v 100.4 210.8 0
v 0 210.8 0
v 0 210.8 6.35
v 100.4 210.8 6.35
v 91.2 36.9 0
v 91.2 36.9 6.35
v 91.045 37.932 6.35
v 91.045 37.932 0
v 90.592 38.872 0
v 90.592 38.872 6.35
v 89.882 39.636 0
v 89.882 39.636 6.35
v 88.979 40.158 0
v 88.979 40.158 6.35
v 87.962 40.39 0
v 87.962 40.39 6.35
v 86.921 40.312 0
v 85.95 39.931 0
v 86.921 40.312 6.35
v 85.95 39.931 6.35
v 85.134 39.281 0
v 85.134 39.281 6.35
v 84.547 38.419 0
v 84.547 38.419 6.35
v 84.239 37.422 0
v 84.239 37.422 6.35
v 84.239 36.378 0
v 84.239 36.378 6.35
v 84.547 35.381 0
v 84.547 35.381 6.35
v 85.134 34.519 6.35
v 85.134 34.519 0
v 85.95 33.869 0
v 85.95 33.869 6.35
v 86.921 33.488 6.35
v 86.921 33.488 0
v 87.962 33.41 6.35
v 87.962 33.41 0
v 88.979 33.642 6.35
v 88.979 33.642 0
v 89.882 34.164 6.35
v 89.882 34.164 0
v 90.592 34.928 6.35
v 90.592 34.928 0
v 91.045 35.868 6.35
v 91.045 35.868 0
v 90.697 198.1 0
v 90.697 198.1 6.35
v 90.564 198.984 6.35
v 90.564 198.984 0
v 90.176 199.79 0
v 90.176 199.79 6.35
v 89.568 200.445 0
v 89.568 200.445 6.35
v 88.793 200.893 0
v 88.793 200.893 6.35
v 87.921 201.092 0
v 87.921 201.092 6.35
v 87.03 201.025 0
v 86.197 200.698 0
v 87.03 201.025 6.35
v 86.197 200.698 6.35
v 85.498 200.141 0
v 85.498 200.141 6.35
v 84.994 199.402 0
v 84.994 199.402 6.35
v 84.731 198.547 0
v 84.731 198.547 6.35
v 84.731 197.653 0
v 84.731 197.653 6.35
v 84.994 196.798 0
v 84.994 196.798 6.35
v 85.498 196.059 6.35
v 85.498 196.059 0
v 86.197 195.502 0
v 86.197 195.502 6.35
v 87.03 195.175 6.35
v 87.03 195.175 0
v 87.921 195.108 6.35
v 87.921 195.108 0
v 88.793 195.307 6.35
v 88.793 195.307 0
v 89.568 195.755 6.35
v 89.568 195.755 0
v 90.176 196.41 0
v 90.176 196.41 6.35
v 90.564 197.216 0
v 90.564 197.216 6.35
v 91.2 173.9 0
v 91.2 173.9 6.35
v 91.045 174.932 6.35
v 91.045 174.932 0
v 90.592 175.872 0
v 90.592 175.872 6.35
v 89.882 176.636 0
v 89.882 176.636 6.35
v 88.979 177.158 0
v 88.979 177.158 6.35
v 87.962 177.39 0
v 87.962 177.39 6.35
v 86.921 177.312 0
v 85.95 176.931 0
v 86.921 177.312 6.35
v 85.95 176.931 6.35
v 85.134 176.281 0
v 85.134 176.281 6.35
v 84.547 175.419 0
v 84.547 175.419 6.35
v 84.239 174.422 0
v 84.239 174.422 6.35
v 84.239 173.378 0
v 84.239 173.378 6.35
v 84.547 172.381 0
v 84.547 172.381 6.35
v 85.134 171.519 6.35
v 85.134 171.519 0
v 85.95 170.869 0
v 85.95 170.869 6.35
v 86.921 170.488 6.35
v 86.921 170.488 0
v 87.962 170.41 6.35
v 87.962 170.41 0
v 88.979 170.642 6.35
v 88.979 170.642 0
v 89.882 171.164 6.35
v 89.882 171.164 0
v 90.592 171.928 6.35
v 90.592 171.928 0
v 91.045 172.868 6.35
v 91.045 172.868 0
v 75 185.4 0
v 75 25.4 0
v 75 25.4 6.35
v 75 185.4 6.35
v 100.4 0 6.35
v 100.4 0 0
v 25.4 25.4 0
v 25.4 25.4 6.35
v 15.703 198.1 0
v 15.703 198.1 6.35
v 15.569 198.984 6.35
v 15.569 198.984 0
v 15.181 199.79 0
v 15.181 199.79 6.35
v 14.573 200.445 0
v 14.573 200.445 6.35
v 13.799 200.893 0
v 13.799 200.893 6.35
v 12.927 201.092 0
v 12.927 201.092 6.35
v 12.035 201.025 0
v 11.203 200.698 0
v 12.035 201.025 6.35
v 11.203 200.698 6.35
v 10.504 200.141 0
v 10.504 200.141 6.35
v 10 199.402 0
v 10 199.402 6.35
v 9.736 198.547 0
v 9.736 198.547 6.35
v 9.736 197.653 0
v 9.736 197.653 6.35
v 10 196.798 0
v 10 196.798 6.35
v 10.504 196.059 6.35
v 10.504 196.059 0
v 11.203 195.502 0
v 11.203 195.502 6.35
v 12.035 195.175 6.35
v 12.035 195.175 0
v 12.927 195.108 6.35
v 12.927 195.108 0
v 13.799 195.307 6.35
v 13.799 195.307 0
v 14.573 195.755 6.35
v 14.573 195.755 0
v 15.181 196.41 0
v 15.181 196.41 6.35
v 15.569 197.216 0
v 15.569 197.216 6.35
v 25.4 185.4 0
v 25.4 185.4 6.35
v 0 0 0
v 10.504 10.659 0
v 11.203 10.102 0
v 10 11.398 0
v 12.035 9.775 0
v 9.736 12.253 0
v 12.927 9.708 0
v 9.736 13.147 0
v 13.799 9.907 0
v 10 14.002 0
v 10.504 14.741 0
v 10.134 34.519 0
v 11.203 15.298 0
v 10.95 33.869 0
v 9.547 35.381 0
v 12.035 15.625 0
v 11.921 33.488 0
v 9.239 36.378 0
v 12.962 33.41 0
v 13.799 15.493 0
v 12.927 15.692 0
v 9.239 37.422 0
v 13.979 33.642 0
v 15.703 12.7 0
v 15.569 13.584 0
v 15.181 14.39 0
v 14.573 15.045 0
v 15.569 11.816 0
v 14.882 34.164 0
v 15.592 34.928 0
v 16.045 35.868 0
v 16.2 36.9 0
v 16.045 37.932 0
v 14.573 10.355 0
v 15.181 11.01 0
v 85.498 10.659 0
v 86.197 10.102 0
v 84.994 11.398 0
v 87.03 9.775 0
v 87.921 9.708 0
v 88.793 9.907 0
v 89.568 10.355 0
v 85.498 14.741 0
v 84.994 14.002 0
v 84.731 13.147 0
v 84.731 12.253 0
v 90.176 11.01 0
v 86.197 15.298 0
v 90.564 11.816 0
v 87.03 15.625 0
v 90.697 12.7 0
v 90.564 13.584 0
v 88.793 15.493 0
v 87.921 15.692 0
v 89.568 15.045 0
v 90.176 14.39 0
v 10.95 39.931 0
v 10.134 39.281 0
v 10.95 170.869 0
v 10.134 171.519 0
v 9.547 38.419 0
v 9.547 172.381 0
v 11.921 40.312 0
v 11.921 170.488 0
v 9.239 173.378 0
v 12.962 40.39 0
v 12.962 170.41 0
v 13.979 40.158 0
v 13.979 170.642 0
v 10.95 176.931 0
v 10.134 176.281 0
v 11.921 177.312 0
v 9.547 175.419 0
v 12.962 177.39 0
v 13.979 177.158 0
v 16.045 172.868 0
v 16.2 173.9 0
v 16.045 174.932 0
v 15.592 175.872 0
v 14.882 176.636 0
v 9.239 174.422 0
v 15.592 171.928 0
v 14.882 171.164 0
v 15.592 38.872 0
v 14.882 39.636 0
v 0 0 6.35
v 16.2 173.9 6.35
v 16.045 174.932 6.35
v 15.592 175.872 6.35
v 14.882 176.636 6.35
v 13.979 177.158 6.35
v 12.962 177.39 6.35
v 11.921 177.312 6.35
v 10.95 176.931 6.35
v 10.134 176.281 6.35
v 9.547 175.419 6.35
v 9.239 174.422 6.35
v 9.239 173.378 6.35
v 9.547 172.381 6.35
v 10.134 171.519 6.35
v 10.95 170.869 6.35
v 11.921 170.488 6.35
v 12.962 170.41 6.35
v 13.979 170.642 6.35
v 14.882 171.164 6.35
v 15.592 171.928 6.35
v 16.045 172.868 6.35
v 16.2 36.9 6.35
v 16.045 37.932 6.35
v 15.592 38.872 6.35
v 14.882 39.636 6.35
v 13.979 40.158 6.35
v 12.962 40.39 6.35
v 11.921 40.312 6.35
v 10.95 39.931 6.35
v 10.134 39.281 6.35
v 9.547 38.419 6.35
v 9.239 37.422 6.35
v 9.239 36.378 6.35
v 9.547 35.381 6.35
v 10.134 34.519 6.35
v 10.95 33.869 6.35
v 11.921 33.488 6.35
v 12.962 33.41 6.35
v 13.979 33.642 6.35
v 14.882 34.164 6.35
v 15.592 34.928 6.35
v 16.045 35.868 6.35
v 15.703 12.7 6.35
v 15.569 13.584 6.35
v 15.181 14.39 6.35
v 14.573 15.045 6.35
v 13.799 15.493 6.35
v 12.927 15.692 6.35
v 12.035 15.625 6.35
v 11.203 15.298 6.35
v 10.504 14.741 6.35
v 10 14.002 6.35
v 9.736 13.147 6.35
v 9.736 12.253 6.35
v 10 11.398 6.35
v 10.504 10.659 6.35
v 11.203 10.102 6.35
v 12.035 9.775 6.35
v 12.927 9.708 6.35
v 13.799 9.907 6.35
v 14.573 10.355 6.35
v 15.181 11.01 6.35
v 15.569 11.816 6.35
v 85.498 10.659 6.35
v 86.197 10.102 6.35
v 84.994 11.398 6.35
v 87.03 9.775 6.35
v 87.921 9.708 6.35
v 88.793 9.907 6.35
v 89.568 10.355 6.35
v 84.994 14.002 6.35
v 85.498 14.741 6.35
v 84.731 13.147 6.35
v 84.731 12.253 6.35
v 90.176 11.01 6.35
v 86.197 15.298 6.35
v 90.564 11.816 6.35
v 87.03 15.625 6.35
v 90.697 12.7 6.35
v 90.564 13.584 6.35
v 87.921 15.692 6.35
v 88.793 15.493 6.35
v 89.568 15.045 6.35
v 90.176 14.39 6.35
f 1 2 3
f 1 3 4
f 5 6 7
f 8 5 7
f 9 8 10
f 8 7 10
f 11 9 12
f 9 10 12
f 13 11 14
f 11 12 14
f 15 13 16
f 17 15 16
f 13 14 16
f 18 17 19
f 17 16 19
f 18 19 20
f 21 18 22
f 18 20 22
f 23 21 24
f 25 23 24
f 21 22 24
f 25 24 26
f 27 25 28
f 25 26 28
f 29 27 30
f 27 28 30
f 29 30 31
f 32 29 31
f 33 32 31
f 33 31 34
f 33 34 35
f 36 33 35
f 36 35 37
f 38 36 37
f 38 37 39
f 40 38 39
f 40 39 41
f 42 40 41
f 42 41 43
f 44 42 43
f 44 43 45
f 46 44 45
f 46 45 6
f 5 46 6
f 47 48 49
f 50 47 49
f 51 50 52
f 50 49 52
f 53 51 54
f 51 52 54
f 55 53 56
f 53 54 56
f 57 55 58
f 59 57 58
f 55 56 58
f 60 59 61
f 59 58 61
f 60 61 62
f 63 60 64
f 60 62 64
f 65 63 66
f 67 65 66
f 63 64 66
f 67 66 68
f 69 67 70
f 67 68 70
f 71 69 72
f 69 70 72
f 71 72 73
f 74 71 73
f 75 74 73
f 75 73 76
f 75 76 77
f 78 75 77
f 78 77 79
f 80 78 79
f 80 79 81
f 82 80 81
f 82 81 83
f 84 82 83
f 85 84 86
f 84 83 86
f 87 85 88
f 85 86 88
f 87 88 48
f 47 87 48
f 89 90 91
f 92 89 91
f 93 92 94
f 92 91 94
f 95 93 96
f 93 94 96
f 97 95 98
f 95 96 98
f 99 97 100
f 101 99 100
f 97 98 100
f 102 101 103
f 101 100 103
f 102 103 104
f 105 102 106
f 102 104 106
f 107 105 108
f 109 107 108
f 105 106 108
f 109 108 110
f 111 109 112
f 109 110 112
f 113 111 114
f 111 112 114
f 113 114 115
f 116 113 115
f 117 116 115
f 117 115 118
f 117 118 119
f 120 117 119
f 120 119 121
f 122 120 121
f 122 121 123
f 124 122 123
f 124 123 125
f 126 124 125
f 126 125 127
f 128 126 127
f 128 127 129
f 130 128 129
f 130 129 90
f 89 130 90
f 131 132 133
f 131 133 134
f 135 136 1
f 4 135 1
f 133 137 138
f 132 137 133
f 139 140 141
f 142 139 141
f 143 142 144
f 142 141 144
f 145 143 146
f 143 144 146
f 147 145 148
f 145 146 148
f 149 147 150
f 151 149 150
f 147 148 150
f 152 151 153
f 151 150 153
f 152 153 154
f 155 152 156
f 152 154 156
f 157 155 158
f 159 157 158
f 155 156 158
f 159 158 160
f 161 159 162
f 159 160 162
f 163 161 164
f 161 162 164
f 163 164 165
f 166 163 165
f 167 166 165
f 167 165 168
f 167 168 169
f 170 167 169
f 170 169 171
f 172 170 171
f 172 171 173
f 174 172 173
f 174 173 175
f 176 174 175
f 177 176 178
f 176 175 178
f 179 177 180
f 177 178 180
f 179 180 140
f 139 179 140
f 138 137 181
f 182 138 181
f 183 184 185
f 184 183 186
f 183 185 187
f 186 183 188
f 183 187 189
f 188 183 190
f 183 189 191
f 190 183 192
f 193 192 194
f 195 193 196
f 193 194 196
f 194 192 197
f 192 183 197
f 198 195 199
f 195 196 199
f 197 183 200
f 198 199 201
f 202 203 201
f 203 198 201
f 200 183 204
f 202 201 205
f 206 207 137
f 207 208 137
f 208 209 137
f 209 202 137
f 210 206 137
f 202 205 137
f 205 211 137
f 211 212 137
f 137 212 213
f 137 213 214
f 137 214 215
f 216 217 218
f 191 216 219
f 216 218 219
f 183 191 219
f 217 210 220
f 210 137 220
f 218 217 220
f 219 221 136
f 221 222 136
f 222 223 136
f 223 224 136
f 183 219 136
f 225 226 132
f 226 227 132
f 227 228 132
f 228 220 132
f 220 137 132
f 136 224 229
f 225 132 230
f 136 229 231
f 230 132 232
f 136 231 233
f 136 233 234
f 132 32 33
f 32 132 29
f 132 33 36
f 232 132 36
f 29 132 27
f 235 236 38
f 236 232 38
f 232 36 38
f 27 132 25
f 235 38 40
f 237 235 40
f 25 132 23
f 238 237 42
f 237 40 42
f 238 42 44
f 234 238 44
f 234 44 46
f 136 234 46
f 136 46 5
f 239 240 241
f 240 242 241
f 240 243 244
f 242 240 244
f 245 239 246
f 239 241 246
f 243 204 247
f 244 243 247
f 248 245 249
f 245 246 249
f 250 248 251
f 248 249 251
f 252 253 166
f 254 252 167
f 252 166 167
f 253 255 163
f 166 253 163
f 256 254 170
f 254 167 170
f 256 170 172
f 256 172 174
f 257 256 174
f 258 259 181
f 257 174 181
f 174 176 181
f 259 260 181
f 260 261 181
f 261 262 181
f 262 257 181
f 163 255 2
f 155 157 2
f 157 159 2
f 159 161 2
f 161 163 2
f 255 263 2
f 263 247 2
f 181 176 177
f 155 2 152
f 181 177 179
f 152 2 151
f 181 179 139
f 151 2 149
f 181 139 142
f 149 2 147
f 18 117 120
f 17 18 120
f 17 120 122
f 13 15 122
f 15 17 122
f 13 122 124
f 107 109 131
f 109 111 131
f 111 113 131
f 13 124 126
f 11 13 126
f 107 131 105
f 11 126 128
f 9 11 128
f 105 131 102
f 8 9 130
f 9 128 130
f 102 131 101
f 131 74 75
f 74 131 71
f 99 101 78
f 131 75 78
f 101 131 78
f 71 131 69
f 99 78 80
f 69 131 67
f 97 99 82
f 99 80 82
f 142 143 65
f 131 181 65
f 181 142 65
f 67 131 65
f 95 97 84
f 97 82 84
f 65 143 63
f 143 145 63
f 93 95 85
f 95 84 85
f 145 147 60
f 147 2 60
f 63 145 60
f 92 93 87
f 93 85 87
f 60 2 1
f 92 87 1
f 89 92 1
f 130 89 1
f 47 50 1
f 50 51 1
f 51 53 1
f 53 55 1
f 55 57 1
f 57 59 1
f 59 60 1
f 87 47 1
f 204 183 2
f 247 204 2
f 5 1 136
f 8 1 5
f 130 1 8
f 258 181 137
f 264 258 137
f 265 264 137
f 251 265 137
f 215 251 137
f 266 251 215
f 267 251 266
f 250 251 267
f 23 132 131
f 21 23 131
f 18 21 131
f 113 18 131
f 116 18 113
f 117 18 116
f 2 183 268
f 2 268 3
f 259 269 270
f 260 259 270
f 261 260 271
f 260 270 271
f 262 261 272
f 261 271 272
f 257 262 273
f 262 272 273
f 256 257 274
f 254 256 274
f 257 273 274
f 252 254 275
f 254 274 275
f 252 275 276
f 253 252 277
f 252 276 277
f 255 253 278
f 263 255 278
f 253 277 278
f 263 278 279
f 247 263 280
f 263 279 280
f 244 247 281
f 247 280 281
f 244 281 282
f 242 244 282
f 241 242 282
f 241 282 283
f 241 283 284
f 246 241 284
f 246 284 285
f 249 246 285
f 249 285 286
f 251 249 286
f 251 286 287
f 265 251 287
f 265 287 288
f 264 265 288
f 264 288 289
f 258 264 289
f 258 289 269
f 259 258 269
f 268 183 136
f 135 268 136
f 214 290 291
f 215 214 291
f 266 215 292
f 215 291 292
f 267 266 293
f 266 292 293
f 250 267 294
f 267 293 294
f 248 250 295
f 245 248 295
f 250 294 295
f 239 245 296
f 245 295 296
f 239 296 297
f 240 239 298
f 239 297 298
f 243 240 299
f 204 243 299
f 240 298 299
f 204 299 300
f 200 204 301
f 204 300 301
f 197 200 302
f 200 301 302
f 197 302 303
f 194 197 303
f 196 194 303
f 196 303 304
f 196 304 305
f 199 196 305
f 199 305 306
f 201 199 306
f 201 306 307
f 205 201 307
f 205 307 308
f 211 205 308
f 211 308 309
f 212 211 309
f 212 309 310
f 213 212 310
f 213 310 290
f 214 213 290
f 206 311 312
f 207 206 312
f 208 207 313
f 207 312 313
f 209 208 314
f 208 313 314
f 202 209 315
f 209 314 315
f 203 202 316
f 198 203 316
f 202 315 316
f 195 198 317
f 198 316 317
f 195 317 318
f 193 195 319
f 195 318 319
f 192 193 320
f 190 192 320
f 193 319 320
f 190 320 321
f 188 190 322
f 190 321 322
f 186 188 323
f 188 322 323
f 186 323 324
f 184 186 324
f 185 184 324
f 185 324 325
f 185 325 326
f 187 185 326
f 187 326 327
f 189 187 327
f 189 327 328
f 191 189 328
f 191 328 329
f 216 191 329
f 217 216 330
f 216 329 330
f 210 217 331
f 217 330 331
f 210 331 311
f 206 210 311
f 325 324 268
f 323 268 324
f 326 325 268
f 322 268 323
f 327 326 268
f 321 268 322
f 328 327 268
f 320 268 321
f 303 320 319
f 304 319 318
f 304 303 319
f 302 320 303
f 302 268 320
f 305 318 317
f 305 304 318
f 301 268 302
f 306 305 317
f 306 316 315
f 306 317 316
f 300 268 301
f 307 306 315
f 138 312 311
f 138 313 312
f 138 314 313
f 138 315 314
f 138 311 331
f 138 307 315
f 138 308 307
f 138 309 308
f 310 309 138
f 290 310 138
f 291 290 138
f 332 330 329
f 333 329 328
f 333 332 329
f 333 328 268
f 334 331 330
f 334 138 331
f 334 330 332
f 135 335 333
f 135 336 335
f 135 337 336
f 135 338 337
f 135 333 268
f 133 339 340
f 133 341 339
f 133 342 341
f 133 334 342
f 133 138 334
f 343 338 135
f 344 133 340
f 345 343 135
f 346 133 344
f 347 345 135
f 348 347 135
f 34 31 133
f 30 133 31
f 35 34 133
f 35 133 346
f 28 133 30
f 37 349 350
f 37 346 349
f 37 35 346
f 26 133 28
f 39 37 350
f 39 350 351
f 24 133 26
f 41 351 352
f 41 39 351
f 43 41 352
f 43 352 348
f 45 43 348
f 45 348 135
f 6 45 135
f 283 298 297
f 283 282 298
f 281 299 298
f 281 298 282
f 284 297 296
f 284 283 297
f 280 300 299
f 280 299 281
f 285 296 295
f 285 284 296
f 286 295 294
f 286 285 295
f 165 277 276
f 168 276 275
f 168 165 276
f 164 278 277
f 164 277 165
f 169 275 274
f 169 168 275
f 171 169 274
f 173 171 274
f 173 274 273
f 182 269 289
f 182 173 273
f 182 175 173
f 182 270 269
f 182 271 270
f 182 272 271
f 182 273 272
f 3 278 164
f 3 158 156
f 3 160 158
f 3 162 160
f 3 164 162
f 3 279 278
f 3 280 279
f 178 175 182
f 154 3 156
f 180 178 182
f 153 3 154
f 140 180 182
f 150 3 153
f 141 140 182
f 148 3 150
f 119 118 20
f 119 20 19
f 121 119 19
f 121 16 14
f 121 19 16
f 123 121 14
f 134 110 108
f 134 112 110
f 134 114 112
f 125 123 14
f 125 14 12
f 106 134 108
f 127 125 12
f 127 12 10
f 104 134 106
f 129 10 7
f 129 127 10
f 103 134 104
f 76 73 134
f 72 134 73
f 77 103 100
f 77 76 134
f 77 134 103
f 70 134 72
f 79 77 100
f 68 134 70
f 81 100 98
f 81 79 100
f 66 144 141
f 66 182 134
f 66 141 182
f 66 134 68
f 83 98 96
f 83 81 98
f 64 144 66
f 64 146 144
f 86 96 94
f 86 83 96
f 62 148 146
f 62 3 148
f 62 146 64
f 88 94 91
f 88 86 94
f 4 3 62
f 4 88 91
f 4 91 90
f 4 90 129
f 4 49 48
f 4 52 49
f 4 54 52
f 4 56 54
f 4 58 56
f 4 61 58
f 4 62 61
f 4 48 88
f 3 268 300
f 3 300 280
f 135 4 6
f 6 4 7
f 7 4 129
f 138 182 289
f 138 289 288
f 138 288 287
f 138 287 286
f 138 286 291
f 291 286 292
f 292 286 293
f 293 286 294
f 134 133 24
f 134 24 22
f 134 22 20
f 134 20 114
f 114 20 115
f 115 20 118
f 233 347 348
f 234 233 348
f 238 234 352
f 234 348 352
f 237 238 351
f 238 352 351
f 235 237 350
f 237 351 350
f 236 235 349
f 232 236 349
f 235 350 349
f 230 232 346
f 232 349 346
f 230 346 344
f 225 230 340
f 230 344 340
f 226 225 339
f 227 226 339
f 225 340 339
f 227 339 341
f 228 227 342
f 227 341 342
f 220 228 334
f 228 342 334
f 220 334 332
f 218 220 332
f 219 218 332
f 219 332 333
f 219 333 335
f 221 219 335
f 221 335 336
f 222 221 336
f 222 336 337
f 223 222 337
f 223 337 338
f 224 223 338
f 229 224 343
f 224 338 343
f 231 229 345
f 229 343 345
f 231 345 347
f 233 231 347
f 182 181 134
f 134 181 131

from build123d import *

# Parameters (mm, degrees)
SKETCH1_W           = 100.4
SKETCH1_H           = 210.8
SKETCH1_W_2         = 49.6
SKETCH1_H_2         = 160
BOSS_EXTRUDE1_DEPTH = 6.35
SKETCH2_R           = 3
CUT_EXTRUDE1_DEPTH  = 6.35
SKETCH3_R           = 3.5
CUT_EXTRUDE2_DEPTH  = 10


with BuildPart() as part:
    # Sketch1 → Boss-Extrude1 (new body)
    with BuildSketch(Plane.XY):
        with Locations((50.2, 105.4)):
            Rectangle(SKETCH1_W, SKETCH1_H)
        with Locations((50.2, 105.4)):
            Rectangle(SKETCH1_W_2, SKETCH1_H_2, mode=Mode.SUBTRACT)
    extrude(amount=BOSS_EXTRUDE1_DEPTH)

    # Sketch2 → Cut-Extrude1 (cut)
    with BuildSketch(Plane.XY.offset(6.35)):
        with Locations((12.70273435, 198.1)):
            Circle(SKETCH2_R)
        with Locations((87.69726565, 198.1)):
            Circle(SKETCH2_R)
        with Locations((87.69726565, 12.7)):
            Circle(SKETCH2_R)
        with Locations((12.70273435, 12.7)):
            Circle(SKETCH2_R)
    extrude(amount=-CUT_EXTRUDE1_DEPTH, mode=Mode.SUBTRACT)

    # Sketch3 → Cut-Extrude2 (cut)
    with BuildSketch(Plane.XY.offset(6.35)):
        with Locations((12.7, 173.9)):
            Circle(SKETCH3_R)
        with Locations((87.7, 173.9)):
            Circle(SKETCH3_R)
        with Locations((87.7, 36.9)):
            Circle(SKETCH3_R)
        with Locations((12.7, 36.9)):
            Circle(SKETCH3_R)
    extrude(amount=-CUT_EXTRUDE2_DEPTH, mode=Mode.SUBTRACT)


solid = part.part
